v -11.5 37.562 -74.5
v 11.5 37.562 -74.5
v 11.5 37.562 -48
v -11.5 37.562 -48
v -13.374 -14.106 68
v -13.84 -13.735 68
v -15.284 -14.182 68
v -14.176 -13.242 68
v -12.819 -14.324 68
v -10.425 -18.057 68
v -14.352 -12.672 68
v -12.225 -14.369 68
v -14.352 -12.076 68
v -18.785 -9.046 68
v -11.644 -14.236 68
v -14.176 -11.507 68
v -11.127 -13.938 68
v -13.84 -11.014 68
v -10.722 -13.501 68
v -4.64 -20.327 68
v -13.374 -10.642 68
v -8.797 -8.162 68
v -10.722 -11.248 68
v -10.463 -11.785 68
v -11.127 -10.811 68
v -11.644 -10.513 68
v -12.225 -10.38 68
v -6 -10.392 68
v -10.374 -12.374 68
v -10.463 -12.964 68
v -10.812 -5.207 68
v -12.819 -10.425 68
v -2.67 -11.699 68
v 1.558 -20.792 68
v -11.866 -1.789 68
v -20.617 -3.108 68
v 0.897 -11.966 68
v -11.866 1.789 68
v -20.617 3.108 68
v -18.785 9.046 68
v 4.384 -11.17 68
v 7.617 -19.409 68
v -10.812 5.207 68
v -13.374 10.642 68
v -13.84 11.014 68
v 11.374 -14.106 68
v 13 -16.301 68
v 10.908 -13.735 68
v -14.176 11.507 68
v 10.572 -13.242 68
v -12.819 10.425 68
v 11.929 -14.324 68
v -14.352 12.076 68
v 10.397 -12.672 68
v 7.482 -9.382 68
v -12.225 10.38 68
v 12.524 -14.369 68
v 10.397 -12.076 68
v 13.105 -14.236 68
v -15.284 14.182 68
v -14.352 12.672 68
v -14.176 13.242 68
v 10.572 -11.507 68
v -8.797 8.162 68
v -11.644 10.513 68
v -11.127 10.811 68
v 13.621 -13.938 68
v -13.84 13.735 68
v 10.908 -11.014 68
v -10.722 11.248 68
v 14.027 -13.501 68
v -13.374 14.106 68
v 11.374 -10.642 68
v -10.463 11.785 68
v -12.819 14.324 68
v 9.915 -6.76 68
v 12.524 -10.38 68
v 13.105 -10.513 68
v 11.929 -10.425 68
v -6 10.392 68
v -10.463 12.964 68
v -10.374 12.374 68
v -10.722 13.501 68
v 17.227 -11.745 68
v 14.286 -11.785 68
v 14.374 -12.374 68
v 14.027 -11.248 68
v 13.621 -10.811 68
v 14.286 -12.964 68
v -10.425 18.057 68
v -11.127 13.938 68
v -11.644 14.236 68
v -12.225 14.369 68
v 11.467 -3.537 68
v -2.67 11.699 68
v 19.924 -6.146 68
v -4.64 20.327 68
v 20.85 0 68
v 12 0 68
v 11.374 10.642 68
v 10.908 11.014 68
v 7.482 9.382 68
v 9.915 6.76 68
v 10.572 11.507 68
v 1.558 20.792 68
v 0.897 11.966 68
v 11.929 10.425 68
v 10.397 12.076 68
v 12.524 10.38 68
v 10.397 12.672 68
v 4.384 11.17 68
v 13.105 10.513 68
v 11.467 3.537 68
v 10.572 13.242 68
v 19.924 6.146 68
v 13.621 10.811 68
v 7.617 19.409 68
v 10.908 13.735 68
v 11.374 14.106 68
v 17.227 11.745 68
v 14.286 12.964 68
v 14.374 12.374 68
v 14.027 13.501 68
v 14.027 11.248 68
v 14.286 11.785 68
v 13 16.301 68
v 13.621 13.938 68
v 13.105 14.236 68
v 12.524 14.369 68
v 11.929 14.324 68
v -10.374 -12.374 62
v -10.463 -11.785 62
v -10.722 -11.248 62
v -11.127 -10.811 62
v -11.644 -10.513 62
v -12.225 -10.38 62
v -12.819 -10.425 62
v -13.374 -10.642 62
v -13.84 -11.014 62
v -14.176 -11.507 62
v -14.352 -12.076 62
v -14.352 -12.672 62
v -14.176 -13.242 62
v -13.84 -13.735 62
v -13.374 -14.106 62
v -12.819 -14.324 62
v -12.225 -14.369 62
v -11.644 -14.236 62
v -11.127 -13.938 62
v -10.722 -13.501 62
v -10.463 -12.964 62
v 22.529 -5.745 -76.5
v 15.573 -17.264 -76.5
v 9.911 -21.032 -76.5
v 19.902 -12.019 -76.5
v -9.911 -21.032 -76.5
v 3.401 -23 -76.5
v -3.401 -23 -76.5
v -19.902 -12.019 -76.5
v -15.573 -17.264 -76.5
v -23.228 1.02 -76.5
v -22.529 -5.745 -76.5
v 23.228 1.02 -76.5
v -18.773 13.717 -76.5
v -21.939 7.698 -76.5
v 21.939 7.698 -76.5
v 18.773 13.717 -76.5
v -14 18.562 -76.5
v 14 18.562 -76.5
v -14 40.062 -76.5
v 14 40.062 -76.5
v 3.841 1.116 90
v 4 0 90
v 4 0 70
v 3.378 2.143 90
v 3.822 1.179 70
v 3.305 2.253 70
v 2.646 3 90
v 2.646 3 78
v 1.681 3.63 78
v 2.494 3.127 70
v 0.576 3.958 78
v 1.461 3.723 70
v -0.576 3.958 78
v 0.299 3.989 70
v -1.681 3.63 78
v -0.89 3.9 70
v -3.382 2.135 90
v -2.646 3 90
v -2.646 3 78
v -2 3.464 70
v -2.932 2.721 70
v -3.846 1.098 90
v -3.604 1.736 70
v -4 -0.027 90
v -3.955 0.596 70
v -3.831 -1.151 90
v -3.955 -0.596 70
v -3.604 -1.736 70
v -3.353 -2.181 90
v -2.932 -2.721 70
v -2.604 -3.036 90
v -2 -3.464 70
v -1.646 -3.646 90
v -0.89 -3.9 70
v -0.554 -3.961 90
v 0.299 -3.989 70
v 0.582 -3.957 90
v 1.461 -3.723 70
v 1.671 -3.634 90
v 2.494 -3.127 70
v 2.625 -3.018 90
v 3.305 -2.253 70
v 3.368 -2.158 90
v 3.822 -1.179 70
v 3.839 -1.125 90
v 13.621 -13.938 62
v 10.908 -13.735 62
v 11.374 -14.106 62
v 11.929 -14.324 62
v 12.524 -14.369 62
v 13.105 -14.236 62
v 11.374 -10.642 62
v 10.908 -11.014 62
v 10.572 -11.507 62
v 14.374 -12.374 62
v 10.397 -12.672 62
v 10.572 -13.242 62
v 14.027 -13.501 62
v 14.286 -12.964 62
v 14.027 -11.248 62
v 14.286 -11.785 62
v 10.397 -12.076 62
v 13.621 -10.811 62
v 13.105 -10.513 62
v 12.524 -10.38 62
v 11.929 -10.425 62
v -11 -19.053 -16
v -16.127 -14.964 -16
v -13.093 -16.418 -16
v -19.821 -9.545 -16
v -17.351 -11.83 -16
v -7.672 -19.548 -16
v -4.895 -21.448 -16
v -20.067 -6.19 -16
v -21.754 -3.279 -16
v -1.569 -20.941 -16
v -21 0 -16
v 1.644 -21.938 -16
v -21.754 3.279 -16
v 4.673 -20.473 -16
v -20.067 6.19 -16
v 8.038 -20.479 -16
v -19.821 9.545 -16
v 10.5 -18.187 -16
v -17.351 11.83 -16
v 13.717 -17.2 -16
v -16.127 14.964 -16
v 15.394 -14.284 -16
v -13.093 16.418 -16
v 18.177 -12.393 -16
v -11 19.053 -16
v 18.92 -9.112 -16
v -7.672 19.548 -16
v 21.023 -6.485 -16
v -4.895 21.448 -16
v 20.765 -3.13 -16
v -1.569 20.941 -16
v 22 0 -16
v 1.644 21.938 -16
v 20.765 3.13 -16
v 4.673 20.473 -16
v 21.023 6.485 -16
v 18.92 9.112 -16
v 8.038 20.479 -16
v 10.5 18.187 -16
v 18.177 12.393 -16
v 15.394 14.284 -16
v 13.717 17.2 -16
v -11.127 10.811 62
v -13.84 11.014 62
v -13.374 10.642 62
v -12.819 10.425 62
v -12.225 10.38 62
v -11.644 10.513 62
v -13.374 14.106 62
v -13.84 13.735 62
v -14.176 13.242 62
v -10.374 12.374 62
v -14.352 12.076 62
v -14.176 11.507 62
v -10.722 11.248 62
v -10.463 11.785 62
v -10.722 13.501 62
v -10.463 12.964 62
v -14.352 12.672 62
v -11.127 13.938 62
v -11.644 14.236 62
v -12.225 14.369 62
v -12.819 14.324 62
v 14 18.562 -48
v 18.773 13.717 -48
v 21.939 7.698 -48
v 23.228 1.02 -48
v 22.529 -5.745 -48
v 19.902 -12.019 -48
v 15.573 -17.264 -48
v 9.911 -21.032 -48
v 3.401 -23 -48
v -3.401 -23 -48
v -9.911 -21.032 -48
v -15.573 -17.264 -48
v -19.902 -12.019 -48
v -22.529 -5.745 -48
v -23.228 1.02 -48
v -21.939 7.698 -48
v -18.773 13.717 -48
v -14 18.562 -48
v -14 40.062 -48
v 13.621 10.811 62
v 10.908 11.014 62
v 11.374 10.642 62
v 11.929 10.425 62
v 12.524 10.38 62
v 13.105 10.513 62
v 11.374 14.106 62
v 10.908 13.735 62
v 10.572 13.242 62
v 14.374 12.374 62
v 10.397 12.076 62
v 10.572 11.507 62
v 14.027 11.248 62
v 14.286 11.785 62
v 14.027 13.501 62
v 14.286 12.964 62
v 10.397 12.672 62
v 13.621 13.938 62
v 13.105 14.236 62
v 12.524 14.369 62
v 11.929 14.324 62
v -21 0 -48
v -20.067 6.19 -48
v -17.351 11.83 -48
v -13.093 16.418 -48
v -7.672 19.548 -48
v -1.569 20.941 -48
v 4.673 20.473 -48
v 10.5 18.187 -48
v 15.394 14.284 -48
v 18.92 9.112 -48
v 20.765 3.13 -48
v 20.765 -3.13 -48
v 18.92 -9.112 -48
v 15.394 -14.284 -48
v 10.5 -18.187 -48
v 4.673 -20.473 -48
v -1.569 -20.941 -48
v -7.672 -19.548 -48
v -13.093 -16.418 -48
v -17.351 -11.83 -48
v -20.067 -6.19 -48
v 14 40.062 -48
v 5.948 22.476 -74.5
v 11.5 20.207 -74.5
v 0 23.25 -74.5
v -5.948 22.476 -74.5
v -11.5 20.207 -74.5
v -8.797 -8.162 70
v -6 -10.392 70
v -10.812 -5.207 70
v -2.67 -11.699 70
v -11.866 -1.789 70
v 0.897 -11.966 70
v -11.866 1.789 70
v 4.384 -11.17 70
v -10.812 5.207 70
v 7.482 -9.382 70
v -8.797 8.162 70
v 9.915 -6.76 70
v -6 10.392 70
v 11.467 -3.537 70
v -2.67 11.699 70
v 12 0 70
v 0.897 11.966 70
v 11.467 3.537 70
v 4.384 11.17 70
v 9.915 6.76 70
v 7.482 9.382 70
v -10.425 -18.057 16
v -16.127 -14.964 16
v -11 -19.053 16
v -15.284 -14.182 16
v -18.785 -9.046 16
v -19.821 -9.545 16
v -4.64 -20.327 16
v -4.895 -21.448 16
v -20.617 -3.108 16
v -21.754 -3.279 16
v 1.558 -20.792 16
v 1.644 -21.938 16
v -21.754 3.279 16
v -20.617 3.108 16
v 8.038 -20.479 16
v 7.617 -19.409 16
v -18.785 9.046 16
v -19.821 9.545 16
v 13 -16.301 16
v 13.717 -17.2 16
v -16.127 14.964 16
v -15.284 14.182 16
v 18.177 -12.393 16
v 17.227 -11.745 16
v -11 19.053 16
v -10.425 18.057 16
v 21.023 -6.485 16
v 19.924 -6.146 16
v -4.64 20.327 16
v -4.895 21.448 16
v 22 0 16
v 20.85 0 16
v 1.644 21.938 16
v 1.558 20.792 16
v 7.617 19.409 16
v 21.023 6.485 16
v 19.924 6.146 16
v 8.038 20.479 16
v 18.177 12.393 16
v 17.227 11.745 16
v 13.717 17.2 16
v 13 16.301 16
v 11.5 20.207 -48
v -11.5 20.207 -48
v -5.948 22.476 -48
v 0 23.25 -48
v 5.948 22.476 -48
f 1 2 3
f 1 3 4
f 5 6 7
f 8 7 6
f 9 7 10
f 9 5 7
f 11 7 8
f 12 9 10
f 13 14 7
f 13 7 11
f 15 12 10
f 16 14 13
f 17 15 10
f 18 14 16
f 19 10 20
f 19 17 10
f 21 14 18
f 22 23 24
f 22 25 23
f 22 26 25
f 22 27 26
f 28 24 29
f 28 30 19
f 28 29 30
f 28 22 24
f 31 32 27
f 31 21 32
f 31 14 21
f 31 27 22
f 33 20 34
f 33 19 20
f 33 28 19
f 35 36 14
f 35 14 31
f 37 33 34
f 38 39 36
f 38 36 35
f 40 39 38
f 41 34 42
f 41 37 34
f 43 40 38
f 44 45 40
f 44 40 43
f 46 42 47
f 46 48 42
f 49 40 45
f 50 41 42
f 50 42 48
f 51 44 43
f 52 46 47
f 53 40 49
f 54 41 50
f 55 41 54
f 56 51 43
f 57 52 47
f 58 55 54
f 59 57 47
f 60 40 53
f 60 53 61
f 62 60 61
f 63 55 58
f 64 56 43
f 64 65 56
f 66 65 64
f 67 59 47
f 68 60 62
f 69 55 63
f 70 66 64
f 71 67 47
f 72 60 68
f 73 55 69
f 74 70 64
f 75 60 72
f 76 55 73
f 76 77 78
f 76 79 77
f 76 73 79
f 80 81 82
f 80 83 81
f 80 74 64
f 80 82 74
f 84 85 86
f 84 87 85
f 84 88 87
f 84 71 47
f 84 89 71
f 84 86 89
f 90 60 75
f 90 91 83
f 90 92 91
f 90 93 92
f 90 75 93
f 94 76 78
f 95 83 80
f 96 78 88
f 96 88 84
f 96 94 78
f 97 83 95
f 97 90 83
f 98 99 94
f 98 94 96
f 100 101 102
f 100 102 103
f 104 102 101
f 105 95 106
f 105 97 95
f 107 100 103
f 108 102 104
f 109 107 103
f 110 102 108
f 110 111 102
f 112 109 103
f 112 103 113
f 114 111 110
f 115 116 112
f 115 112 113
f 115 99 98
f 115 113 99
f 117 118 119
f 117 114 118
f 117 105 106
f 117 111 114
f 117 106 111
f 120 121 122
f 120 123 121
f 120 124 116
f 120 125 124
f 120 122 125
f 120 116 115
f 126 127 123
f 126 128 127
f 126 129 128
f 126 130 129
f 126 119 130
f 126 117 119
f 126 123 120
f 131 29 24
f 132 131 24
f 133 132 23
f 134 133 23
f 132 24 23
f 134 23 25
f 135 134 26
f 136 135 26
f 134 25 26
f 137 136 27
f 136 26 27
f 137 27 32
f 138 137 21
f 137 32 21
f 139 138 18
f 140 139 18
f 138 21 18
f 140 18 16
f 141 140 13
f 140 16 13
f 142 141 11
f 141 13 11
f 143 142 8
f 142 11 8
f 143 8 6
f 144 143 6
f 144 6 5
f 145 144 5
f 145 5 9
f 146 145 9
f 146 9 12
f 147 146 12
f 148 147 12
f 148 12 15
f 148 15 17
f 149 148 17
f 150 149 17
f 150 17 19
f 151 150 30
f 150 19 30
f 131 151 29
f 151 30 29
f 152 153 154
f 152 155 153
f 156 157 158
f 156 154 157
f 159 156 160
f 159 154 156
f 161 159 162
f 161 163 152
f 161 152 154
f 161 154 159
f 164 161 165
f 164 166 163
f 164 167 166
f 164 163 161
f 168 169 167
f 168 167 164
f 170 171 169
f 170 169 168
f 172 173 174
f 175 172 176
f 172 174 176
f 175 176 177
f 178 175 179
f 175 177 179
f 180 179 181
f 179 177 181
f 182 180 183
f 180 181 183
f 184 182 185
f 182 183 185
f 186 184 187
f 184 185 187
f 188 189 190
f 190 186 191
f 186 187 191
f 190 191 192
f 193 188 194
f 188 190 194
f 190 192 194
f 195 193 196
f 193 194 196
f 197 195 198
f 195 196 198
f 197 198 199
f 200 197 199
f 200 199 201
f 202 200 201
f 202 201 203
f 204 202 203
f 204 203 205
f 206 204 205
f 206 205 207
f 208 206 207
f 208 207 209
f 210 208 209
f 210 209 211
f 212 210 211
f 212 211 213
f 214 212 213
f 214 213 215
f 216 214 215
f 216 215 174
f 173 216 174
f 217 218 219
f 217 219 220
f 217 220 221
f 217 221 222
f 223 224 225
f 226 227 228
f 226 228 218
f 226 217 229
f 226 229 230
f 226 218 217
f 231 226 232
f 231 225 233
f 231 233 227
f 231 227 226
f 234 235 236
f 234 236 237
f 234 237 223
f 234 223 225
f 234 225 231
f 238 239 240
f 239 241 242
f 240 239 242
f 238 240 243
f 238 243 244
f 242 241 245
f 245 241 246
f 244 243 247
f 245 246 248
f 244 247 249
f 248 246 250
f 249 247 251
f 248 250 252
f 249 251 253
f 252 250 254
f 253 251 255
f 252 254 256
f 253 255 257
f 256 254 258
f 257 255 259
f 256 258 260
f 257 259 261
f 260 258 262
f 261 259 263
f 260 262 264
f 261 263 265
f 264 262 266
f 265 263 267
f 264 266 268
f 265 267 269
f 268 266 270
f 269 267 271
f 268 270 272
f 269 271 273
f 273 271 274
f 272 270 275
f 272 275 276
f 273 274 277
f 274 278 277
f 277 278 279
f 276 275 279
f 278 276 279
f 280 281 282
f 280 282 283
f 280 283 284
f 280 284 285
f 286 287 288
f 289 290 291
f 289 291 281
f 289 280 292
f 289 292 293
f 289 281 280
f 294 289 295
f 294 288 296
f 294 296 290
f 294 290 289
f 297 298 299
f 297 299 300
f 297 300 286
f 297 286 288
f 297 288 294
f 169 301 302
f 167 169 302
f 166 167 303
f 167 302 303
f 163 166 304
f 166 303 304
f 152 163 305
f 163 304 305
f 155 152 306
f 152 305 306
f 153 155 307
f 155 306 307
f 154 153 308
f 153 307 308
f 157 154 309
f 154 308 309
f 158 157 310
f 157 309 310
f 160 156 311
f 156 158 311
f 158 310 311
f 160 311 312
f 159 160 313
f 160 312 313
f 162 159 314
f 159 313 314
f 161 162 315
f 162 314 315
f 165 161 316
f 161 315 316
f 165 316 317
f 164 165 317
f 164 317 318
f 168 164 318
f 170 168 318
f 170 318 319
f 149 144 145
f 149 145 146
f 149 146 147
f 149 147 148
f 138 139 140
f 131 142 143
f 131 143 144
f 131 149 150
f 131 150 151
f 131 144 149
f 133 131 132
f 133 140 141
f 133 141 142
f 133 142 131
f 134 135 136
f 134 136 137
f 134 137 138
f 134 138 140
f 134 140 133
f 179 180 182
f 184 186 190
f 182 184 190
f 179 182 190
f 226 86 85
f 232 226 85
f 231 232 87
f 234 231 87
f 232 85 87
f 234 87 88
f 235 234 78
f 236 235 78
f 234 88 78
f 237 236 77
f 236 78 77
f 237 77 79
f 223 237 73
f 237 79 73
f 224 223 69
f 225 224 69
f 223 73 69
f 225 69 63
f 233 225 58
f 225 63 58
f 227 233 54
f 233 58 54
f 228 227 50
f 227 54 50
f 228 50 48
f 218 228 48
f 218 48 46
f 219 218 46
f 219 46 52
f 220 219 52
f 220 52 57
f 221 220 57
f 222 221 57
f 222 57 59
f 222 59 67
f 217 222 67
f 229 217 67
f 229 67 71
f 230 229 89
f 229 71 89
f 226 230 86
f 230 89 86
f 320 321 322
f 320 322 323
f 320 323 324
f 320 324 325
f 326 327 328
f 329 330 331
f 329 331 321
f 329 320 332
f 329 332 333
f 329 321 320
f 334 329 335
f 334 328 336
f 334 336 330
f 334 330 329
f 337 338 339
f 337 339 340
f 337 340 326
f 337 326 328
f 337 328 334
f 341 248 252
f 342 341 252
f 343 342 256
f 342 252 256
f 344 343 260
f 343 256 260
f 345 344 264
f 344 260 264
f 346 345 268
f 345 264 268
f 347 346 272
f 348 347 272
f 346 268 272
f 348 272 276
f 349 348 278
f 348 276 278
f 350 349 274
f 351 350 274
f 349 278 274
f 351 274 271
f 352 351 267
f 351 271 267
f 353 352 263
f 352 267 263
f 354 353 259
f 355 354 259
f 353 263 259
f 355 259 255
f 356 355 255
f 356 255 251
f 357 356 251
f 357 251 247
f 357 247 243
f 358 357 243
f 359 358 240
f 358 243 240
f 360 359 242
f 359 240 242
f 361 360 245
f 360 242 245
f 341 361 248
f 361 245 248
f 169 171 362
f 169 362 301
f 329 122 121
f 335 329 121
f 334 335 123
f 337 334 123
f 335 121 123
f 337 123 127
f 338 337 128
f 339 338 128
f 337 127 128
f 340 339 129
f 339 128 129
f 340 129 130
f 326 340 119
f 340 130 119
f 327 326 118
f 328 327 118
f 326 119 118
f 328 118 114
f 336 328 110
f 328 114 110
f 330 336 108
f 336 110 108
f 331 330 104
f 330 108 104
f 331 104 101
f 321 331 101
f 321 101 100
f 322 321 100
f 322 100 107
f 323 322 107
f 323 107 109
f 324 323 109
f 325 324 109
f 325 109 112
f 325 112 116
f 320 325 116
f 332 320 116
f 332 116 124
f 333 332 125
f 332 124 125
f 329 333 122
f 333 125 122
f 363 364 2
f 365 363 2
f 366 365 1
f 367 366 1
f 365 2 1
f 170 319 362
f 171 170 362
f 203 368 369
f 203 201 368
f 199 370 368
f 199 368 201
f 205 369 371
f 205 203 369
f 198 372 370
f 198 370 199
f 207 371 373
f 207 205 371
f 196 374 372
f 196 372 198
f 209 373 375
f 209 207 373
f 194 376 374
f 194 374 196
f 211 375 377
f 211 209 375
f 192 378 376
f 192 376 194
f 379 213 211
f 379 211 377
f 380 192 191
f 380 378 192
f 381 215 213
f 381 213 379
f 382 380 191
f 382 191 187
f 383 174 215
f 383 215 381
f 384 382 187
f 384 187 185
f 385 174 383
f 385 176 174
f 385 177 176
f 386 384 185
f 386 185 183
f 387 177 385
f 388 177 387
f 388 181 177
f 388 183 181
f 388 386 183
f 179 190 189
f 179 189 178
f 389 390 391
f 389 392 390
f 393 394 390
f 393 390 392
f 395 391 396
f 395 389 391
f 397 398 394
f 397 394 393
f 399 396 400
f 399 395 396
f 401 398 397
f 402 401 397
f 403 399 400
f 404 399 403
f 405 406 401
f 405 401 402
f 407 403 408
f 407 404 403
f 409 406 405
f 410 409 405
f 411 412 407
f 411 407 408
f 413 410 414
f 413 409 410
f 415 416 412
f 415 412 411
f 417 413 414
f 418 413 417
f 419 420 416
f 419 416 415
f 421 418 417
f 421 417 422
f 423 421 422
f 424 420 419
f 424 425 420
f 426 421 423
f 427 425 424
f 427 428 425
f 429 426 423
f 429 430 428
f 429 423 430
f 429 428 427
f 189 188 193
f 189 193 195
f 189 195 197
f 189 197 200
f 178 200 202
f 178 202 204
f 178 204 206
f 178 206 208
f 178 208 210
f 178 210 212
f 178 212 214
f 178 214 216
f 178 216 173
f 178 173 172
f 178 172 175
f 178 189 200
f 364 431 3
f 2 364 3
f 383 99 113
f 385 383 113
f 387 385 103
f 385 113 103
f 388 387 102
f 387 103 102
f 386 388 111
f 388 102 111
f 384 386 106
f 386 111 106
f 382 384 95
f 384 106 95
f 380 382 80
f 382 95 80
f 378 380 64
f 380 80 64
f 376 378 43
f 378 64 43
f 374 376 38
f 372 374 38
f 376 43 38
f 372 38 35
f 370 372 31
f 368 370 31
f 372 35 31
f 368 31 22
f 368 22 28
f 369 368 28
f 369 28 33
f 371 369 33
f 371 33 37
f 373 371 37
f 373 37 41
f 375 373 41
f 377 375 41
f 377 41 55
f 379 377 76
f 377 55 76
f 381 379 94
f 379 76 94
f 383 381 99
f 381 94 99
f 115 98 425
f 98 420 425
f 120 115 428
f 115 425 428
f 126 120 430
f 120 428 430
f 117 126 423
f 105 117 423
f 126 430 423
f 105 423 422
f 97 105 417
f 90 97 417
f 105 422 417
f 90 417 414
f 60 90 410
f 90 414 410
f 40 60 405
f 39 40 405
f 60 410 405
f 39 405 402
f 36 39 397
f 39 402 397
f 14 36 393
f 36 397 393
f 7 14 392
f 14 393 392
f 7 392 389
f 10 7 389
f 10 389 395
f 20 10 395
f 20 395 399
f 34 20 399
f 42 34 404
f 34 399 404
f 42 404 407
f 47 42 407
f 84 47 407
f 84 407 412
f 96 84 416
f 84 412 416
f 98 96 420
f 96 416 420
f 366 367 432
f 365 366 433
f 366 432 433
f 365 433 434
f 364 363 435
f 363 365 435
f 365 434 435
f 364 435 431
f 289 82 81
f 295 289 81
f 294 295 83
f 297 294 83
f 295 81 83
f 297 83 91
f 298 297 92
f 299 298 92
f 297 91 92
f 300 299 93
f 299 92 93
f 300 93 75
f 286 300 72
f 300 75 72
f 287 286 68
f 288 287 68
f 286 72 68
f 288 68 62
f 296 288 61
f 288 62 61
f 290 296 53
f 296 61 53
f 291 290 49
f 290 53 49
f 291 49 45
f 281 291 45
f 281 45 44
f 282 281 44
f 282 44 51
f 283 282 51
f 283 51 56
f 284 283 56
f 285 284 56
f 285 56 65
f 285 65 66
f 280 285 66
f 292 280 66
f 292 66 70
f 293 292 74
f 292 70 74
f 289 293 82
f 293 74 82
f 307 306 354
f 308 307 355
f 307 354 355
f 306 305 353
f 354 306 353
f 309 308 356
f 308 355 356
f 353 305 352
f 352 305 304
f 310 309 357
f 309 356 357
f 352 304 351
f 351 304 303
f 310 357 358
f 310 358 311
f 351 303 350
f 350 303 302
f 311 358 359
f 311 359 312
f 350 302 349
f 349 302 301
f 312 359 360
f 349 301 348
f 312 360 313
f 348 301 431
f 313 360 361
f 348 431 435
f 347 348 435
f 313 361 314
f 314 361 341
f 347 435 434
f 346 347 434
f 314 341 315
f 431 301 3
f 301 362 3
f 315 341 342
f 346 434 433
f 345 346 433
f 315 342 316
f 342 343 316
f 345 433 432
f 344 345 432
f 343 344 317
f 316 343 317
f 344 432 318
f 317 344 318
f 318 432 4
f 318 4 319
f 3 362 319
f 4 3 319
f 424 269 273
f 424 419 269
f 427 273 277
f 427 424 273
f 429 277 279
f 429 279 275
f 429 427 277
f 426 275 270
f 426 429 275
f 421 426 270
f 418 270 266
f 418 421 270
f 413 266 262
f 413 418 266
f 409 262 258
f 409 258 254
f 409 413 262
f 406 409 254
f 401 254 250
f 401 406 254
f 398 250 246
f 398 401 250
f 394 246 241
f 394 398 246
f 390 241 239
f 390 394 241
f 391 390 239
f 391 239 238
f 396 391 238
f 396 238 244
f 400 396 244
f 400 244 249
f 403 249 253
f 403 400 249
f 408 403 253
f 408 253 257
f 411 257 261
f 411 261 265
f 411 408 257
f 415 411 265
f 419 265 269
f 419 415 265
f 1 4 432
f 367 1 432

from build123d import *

# Parameters (mm, degrees)
BOSS_EXTRUDE1_DEPTH      = 16
BOSS_EXTRUDE1_DEPTH_BACK = 16
SKETCH1_R                = 22
SKETCH2_R                = 20.85
BOSS_EXTRUDE2_DEPTH      = 8
SKETCH3_R                = 20.85
BOSS_EXTRUDE3_DEPTH      = 44
SKETCH4_R                = 21
BOSS_EXTRUDE4_DEPTH      = 32
SKETCH5_R                = 23.25
BOSS_EXTRUDE5_DEPTH      = 28.5
BOSS_EXTRUDE6_START      = -28.5
BOSS_EXTRUDE6_DEPTH      = 28.5
SKETCH7_R                = 12
BOSS_EXTRUDE7_DEPTH      = 2
SKETCH8_R                = 2
CUT_EXTRUDE1_DEPTH       = 6
SKETCH9_W                = 24.120250452
SKETCH9_H                = 20.982117735
BOSS_EXTRUDE8_DEPTH      = 2
SKETCH10_R               = 4
BOSS_EXTRUDE9_DEPTH      = 20
CUT_EXTRUDE2_DEPTH       = 12


with BuildPart() as part:
    # Sketch1 → Boss-Extrude1 (new, two sides: drawn at the far end of the back side and taken through both)
    with BuildSketch(Plane.XY.offset(-BOSS_EXTRUDE1_DEPTH_BACK)):
        Circle(SKETCH1_R)
    extrude(amount=BOSS_EXTRUDE1_DEPTH + BOSS_EXTRUDE1_DEPTH_BACK)

    # Sketch2 → Boss-Extrude2 (add)
    with BuildSketch(Plane.XY.offset(16)):
        Circle(SKETCH2_R)
    extrude(amount=BOSS_EXTRUDE2_DEPTH)

    # Sketch3 → Boss-Extrude3 (add)
    with BuildSketch(Plane.XY.offset(24)):
        Circle(SKETCH3_R)
    extrude(amount=BOSS_EXTRUDE3_DEPTH)

    # Sketch4 → Boss-Extrude4 (add)
    with BuildSketch(Plane(origin=(0, 0, -16), x_dir=(-1, 0, 0), z_dir=(0, 0, -1))):
        Circle(SKETCH4_R)
    extrude(amount=BOSS_EXTRUDE4_DEPTH)

    # Sketch5 → Boss-Extrude5 (add)
    with BuildSketch(Plane(origin=(0, 0, -48), x_dir=(-1, 0, 0), z_dir=(0, 0, -1))):
        Circle(SKETCH5_R)
    extrude(amount=BOSS_EXTRUDE5_DEPTH)

    # Sketch6 → Boss-Extrude6 (add)
    with BuildSketch(Plane(origin=(0, 0, -76.5), x_dir=(-1, 0, 0), z_dir=(0, 0, -1)).offset(BOSS_EXTRUDE6_START)):
        with BuildLine():
            Line((14, 40.062394781), (-14, 40.062394781))
            Line((-14, 40.062394781), (-14, 18.562394781))
            ThreePointArc((-14, 18.562394781), (-12.776481168, 19.424830217), (-11.5, 20.206743924))
            Line((-11.5, 20.206743924), (-11.5, 37.562394781))
            Line((-11.5, 37.562394781), (11.5, 37.562394781))
            Line((11.5, 37.562394781), (11.5, 20.206743924))
            ThreePointArc((11.5, 20.206743924), (12.776481168, 19.424830217), (14, 18.562394781))
            Line((14, 18.562394781), (14, 40.062394781))
        make_face()
    extrude(amount=BOSS_EXTRUDE6_DEPTH)

    # Sketch7 → Boss-Extrude7 (add)
    with BuildSketch(Plane.XY.offset(68)):
        Circle(SKETCH7_R)
    extrude(amount=BOSS_EXTRUDE7_DEPTH)

    # Sketch8 → Cut-Extrude1 (cut)
    with BuildSketch(Plane.XY.offset(68)):
        with Locations((12.374368671, 12.374368671)):
            Circle(SKETCH8_R)
        with Locations((12.374368671, -12.374368671)):
            Circle(SKETCH8_R)
        with Locations((-12.374368671, -12.374368671)):
            Circle(SKETCH8_R)
        with Locations((-12.374368671, 12.374368671)):
            Circle(SKETCH8_R)
    extrude(amount=-CUT_EXTRUDE1_DEPTH, mode=Mode.SUBTRACT)

    # Sketch9 → Boss-Extrude8 (add)
    with BuildSketch(Plane(origin=(0, 0, -76.5), x_dir=(-1, 0, 0), z_dir=(0, 0, -1))):
        with Locations((0, 27.637719743)):
            Rectangle(SKETCH9_W, SKETCH9_H)
    extrude(amount=-BOSS_EXTRUDE8_DEPTH)

    # Sketch10 → Boss-Extrude9 (add)
    with BuildSketch(Plane.XY.offset(70)):
        Circle(SKETCH10_R)
    extrude(amount=BOSS_EXTRUDE9_DEPTH)

    # Sketch11 → Cut-Extrude2 (cut)
    with BuildSketch(Plane.XY.offset(90)):
        Polygon((0, 3), (-3.981730615, 3), (-3.981730615, 4.192756348), (4.050863087, 4.192756348), (4.050863087, 3), align=None)
    extrude(amount=-CUT_EXTRUDE2_DEPTH, mode=Mode.SUBTRACT)


solid = part.part
